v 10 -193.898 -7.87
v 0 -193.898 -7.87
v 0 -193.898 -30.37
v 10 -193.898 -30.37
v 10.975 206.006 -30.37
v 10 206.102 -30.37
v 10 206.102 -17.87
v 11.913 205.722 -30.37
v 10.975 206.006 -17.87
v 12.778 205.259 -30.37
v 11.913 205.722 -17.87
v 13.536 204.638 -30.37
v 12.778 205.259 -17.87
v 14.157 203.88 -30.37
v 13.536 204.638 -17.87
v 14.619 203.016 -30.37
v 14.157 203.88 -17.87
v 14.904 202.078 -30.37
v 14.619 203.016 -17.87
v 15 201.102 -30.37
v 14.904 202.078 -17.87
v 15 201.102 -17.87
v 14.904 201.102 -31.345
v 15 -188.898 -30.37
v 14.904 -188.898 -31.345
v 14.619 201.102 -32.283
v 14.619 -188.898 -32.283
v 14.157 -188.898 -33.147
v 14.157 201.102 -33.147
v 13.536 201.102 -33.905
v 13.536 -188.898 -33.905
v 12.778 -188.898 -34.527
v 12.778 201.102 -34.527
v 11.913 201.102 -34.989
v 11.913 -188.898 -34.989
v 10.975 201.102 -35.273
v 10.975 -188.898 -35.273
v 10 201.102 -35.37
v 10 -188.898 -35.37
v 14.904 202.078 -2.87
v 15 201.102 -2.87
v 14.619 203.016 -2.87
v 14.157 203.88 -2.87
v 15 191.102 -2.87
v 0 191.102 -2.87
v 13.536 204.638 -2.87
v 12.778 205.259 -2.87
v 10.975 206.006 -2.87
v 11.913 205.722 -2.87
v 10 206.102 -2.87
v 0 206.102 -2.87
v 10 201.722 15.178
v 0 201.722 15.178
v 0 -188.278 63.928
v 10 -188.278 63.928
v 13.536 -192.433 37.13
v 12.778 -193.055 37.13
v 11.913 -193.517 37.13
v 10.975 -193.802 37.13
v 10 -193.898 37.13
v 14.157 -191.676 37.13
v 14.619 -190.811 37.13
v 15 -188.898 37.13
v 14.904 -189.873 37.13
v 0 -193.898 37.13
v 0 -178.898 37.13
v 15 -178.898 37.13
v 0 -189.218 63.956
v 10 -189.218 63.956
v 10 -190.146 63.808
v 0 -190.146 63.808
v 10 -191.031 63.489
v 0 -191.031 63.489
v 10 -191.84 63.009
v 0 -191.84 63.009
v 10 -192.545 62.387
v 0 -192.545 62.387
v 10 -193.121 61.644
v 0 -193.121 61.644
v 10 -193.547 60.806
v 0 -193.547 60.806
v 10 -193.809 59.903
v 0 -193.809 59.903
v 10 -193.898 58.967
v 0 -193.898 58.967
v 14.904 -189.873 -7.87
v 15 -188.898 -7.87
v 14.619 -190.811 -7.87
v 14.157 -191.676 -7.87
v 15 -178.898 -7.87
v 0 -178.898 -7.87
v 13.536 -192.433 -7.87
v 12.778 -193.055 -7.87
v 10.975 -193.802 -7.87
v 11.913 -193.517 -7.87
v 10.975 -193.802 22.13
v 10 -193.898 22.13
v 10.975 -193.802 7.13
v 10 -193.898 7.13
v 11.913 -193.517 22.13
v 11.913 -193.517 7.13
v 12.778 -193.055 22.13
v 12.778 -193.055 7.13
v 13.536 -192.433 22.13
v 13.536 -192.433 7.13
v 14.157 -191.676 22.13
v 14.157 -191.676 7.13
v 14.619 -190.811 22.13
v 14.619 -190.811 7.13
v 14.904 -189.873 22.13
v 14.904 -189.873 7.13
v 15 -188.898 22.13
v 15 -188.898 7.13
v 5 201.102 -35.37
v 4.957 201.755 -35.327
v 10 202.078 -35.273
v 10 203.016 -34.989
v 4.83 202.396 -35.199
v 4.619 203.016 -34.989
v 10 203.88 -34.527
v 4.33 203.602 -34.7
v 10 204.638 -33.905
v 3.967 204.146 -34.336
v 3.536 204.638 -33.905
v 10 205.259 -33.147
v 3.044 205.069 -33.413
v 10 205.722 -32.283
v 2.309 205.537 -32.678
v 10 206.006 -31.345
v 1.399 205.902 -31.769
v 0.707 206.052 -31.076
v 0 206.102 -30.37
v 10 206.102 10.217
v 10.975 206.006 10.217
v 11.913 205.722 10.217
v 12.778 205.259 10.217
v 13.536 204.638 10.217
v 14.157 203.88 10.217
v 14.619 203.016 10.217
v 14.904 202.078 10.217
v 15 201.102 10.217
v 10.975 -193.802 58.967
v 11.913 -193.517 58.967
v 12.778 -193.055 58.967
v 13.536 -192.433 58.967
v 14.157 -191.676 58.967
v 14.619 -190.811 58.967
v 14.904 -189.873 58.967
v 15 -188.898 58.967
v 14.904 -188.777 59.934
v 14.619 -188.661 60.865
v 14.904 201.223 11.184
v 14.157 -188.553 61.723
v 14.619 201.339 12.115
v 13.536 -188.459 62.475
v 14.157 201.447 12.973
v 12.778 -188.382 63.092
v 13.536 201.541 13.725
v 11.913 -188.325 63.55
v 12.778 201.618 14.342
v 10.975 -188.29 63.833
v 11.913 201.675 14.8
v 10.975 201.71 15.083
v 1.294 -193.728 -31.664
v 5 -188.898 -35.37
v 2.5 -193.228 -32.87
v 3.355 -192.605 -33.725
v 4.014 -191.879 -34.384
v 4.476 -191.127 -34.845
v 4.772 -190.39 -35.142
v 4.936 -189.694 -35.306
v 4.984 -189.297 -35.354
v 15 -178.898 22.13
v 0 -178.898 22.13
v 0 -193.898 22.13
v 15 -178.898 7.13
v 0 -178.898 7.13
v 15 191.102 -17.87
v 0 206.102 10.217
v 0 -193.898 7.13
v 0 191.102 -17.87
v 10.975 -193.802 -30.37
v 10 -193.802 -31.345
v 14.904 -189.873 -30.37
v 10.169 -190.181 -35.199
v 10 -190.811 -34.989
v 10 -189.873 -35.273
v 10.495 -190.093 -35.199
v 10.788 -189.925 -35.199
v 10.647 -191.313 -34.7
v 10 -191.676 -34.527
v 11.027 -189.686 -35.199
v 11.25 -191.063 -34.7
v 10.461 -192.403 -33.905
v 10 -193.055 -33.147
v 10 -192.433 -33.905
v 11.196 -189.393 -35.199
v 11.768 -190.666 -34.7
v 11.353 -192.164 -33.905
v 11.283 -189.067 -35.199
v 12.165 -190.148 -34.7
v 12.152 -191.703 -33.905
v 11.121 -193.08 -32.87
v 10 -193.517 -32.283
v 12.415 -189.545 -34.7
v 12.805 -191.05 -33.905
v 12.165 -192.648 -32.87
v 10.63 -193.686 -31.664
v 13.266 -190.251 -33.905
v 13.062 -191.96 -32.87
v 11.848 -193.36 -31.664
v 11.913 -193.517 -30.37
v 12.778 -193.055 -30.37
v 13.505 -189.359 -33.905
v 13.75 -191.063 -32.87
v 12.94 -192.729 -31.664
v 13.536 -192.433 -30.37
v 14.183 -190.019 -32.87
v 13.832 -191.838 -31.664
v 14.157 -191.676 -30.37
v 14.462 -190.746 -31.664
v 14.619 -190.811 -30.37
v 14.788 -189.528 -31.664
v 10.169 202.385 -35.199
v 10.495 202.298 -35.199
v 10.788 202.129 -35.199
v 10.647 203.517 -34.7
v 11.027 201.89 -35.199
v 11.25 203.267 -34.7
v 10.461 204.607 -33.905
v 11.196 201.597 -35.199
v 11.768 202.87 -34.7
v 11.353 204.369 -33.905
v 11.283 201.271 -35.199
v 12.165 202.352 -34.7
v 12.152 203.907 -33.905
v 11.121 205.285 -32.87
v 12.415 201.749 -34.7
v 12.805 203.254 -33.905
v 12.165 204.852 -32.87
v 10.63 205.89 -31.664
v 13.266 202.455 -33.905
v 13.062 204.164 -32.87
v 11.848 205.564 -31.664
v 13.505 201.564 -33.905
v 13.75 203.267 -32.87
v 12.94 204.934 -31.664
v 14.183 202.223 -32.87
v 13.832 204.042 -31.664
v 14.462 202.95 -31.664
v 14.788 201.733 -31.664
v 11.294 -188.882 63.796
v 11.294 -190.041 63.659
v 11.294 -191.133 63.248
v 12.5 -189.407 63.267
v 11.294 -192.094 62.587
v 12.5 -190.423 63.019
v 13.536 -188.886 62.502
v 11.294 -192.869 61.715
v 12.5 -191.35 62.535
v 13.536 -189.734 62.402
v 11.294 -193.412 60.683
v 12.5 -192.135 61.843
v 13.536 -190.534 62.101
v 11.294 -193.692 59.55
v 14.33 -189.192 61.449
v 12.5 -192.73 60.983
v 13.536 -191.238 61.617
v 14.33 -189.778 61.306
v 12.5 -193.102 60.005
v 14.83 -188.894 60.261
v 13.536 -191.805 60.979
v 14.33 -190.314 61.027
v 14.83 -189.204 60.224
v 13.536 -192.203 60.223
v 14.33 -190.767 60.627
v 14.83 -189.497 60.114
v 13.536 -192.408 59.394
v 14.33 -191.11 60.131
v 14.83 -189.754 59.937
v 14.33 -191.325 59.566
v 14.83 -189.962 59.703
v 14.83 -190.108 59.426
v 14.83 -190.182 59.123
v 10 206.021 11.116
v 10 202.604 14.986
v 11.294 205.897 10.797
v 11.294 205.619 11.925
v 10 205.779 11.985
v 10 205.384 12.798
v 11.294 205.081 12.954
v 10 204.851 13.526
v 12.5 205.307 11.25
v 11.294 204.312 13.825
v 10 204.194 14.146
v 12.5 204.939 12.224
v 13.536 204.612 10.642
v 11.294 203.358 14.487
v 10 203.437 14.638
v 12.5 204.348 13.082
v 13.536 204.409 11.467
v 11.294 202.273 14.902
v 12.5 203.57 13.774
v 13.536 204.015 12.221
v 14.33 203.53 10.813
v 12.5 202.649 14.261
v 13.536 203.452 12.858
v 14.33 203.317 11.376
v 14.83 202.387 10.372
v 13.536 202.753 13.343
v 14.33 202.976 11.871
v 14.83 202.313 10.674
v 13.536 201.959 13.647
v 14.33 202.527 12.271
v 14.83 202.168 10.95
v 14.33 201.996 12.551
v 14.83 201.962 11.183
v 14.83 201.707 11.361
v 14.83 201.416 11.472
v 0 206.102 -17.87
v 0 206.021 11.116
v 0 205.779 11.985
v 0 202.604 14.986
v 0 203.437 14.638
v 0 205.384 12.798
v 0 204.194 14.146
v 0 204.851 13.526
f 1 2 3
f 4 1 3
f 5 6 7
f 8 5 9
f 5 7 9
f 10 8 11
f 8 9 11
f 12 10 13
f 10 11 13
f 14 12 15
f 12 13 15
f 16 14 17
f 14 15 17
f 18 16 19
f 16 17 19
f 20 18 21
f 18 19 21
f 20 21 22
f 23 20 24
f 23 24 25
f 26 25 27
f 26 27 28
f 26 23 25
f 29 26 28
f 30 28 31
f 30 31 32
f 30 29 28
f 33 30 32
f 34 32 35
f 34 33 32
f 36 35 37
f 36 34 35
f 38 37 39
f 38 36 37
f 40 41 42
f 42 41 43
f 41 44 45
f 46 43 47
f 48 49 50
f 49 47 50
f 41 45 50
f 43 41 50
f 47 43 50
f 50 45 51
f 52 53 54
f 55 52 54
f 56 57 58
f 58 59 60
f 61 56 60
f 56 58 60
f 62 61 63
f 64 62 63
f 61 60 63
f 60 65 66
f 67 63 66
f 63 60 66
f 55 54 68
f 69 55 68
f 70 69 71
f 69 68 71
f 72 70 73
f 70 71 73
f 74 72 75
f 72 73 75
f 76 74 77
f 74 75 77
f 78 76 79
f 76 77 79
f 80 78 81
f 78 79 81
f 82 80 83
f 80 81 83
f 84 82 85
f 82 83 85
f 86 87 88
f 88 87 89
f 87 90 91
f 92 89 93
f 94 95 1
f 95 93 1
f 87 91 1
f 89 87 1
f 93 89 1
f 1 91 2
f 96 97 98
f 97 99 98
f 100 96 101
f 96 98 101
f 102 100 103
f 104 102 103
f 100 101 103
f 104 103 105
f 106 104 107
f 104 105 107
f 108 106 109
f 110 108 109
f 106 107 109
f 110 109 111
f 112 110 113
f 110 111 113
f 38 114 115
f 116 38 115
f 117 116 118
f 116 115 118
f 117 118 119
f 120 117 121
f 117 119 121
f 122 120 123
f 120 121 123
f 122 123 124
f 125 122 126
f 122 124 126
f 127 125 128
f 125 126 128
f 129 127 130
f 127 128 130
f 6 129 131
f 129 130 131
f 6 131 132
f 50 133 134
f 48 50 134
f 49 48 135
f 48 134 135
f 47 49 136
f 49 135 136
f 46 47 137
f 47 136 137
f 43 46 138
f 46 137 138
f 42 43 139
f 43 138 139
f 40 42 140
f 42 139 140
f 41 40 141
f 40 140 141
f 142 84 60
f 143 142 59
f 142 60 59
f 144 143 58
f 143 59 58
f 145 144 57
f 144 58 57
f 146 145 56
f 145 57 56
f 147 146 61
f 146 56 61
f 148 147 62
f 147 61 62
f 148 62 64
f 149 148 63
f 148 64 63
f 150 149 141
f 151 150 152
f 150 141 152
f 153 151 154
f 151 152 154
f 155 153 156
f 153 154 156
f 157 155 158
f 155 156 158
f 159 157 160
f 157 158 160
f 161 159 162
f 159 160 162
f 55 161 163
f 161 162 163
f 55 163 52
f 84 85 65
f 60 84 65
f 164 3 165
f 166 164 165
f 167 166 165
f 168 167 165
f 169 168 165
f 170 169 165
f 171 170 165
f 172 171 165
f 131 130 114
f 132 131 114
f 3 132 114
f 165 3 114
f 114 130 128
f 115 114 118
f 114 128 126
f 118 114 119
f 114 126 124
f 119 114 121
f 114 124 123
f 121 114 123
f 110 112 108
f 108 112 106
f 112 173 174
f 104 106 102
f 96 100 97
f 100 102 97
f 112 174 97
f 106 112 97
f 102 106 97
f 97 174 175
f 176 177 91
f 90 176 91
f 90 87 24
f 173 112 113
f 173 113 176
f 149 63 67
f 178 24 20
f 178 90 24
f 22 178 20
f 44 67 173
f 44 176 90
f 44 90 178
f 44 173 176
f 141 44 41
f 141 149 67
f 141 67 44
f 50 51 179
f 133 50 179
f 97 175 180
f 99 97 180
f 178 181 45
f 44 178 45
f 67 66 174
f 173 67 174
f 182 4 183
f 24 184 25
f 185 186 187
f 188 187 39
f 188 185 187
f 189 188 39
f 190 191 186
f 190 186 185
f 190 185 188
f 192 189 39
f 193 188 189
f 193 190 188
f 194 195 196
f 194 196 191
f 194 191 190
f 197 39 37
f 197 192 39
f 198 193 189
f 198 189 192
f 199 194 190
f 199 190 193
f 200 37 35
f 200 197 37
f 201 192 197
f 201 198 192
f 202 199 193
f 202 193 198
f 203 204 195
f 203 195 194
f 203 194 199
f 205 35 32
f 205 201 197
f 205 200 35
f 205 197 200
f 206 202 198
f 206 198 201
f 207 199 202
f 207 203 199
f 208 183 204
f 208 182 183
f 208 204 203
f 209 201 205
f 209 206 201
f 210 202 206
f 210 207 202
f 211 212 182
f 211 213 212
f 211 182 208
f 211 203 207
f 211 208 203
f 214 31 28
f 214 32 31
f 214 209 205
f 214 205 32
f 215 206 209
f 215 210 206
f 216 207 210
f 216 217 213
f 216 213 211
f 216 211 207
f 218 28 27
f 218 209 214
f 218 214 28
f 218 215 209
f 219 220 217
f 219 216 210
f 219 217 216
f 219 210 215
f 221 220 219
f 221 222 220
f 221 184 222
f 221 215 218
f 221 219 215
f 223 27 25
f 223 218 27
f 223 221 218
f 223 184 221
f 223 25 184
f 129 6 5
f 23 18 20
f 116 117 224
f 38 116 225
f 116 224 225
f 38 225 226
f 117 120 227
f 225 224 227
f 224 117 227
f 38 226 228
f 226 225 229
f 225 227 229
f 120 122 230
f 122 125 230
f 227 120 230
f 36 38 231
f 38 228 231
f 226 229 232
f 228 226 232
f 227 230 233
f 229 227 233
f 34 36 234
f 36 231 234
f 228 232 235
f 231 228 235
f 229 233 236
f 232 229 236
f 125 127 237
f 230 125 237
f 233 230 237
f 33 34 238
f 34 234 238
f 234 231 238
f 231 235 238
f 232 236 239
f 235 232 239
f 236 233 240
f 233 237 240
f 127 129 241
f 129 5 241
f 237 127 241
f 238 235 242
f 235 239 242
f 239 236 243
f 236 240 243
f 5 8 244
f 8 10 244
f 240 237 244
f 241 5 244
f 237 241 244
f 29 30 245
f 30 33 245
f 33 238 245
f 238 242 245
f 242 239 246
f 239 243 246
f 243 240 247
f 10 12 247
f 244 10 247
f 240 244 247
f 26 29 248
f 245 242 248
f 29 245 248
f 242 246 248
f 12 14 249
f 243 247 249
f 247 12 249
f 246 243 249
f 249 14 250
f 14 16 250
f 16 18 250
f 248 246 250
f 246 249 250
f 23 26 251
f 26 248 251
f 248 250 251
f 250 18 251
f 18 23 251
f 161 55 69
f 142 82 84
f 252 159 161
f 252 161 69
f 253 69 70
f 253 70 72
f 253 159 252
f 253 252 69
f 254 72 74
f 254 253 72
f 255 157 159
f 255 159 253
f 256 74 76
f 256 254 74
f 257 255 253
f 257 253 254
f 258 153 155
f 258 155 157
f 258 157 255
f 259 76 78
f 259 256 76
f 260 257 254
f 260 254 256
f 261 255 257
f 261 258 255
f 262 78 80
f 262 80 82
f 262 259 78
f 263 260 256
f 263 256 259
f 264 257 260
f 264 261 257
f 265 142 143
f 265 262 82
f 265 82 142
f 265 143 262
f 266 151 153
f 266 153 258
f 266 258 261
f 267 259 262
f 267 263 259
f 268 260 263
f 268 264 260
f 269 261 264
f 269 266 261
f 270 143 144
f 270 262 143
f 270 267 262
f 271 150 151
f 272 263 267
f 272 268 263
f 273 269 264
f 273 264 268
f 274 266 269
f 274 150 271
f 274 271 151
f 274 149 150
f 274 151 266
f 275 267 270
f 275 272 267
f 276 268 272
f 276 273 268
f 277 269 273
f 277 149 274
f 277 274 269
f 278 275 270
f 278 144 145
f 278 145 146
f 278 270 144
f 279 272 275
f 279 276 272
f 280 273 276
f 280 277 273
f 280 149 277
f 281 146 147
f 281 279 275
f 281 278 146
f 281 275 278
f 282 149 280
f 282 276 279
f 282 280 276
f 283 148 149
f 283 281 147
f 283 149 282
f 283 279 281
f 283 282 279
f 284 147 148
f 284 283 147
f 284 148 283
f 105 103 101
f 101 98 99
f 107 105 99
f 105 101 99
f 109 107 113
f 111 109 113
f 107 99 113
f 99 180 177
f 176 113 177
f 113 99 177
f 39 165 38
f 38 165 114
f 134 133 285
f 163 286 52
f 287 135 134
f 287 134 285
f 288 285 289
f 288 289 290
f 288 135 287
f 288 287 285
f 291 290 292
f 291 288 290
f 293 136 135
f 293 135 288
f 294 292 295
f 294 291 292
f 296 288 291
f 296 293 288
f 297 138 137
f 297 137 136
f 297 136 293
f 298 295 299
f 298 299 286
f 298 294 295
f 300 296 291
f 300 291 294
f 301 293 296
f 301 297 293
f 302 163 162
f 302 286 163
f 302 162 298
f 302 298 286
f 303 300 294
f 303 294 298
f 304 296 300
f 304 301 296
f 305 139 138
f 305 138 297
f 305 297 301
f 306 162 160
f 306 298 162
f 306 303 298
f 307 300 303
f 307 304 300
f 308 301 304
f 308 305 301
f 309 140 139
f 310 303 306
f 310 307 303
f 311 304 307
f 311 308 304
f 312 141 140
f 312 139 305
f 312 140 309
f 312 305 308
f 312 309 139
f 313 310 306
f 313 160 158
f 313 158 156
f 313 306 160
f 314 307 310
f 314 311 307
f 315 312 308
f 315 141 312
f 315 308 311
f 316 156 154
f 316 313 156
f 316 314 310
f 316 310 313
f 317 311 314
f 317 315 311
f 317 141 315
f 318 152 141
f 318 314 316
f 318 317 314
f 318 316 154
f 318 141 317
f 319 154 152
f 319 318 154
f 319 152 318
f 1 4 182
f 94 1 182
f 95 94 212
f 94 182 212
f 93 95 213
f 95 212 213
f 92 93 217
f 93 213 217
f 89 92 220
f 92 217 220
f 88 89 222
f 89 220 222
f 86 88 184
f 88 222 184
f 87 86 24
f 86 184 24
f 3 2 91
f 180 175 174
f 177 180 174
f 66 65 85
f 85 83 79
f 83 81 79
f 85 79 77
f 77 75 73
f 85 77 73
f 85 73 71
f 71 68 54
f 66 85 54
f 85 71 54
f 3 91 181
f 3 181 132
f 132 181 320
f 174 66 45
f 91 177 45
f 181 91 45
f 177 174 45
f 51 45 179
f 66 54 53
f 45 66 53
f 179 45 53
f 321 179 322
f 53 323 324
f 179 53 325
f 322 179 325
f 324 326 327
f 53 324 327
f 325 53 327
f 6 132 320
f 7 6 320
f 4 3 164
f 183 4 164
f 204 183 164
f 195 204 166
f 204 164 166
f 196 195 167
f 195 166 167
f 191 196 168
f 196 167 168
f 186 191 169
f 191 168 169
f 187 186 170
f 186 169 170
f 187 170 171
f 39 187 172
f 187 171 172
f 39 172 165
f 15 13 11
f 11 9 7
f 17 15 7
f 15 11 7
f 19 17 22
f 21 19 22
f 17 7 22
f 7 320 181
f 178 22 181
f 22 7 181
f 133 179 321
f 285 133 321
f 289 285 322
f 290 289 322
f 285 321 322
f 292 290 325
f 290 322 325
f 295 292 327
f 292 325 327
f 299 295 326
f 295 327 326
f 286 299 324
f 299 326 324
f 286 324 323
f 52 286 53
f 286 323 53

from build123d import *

# Parameters (mm, degrees)
F1_DEPTH     = 15
F2_R         = 5
F3_T1_DEPTH  = 418.0350652296
F4_T1_DEPTH  = 390
F4_T3_DEPTH  = 22.5
F4_T5_DEPTH  = 21.0347777317
F4_T7_DEPTH  = 24.1597777317
F4_T12_DEPTH = 5
F4_T18_DEPTH = 5
F4_T22_ANGLE = 90
F4_T24_ANGLE = 90
F5_T1_DEPTH  = 415.7168298797


# Not quite as in the source:
# - a fillet or chamfer that OpenCascade refuses, or shapes differently, is made with other operations: its cross-section is extruded or revolved along the edge and cut away or added


with BuildPart() as f1:
    # F0 (on Right) → F1 (new body)
    with BuildSketch(Plane.YZ):
        Polygon((-193.8978725672, -35.3695585671), (206.1021274328, -35.3695585671), (206.1021274328, -17.8695585671), (191.1021274328, -17.8695585671), (191.1021274328, -2.8695585671), (206.1021274328, -2.8695585671), (206.1021274328, 14.6304414329), (-193.8978725672, 64.6304414329), (-193.8978725672, 37.1304414329), (-178.8978725672, 37.1304414329), (-178.8978725672, 22.1304414329), (-193.8978725672, 22.1304414329), (-193.8978725672, 7.1304414329), (-178.8978725672, 7.1304414329), (-178.8978725672, -7.8695585671), (-193.8978725672, -7.8695585671), align=None)
    extrude(amount=F1_DEPTH)

    # F2
    f2_edges = [f1.edges().sort_by_distance(p)[0] for p in [
        (15, 206.102127, 5.880441),
        (15, 206.102127, -26.619559),
        (15, -193.897873, -21.619559),
        (15, -193.897873, 14.630441),
        (15, -193.897873, 50.880441),
    ]]
    fillet(f2_edges, radius=F2_R)

    # F3: fillet of radius 5 on 1 edges, made by hand

    # F3_s2 → F3_t1 (cut)
    with BuildSketch(Plane(origin=(0, 208.5341292164, -26.0667661521), x_dir=(1, 0, 0), z_dir=(0, -0.9922778767, 0.1240347346))):
        with BuildLine():
            ThreePointArc((15, 35.0812860348), (13.5355339059, 38.6168199408), (10, 40.0812860348))
            Line((10, 40.0812860348), (15, 40.0812860348))
            Line((15, 40.0812860348), (15, 35.0812860348))
        make_face()
    extrude(amount=F3_T1_DEPTH, mode=Mode.SUBTRACT)

    # F4: fillet of radius 5 on 7 edges, made by hand

    # F4_s2 → F4_t1 (cut)
    with BuildSketch(Plane.XZ.offset(-201.1021274328)):
        with BuildLine():
            ThreePointArc((15, -30.3695585671), (13.5355339059, -33.905092473), (10, -35.3695585671))
            Line((10, -35.3695585671), (15, -35.3695585671))
            Line((15, -35.3695585671), (15, -30.3695585671))
        make_face()
    extrude(amount=F4_T1_DEPTH, mode=Mode.SUBTRACT)

    # F4_s4 → F4_t3 (cut)
    with BuildSketch(Plane.YZ.offset(-12.5)):
        with BuildLine():
            ThreePointArc((-193.8978725672, -30.3695585671), (-192.4334064731, -33.905092473), (-188.8978725672, -35.3695585671))
            Line((-188.8978725672, -35.3695585671), (-193.8978725672, -35.3695585671))
            Line((-193.8978725672, -35.3695585671), (-193.8978725672, -30.3695585671))
        make_face()
        with BuildLine():
            ThreePointArc((201.1021274328, -35.3695585671), (204.6376613388, -33.905092473), (206.1021274328, -30.3695585671))
            Line((206.1021274328, -30.3695585671), (206.1021274328, -35.3695585671))
            Line((206.1021274328, -35.3695585671), (201.1021274328, -35.3695585671))
        make_face()
    extrude(amount=F4_T3_DEPTH, mode=Mode.SUBTRACT)

    # F4_s6 → F4_t5 (cut)
    with BuildSketch(Plane.YZ.offset(-11.0347777317)):
        with BuildLine():
            ThreePointArc((206.1021274328, 10.2165303402), (204.8505183119, 13.5255431564), (201.7223011058, 15.1779197238))
            Line((201.7223011058, 15.1779197238), (206.1021274328, 14.6304414329))
            Line((206.1021274328, 14.6304414329), (206.1021274328, 10.2165303402))
        make_face()
    extrude(amount=F4_T5_DEPTH, mode=Mode.SUBTRACT)

    # F4_s8 → F4_t7 (cut)
    with BuildSketch(Plane.YZ.offset(-14.1597777317)):
        with BuildLine():
            ThreePointArc((-188.2776988942, 63.9279197238), (-192.2068853834, 62.7149212193), (-193.8978725672, 58.9665303402))
            Line((-193.8978725672, 58.9665303402), (-193.8978725672, 64.6304414329))
            Line((-193.8978725672, 64.6304414329), (-188.2776988942, 63.9279197238))
        make_face()
    extrude(amount=F4_T7_DEPTH, mode=Mode.SUBTRACT)


with BuildPart() as f4_tool10:
    # F4_s11 → F4_t12 (new body)
    with BuildSketch(Plane.YZ.offset(10)):
        Polygon((-188.8978725672, 58.9665303402), (-188.2776988942, 63.9279197238), (-193.8978725672, 64.6304414329), (-193.8978725672, 58.9665303402), align=None)
    extrude(amount=F4_T12_DEPTH)

    # F4_s13 → F4_t14 (revolve, cut)
    with BuildSketch(Plane(origin=(10, -188.8978725672, 58.9665303402), x_dir=(0, 0.6618025632, -0.7496781758), z_dir=(0, -0.7496781758, -0.6618025632))):
        with BuildLine():
            ThreePointArc((0, -5), (5, 0), (0, 5))
            Line((0, 5), (0, -5))
        make_face()
    revolve(axis=Axis((10, -188.8978725672, 58.9665303402), (1, 0, 0)), mode=Mode.SUBTRACT)


with BuildPart() as f1_1:
    add(f1.part)

    # F4_t9: cut F4_tool10
    add(f4_tool10.part, mode=Mode.SUBTRACT)


with BuildPart() as f4_tool16:
    # F4_s17 → F4_t18 (new body)
    with BuildSketch(Plane.YZ.offset(10)):
        Polygon((201.1021274328, 10.2165303402), (206.1021274328, 10.2165303402), (206.1021274328, 14.6304414329), (201.7223011058, 15.1779197238), align=None)
    extrude(amount=F4_T18_DEPTH)

    # F4_s19 → F4_t20 (revolve, cut)
    with BuildSketch(Plane(origin=(10, 201.1021274328, 10.2165303402), x_dir=(0, -0.7496781758, -0.6618025632), z_dir=(0, -0.6618025632, 0.7496781758))):
        with BuildLine():
            ThreePointArc((0, -5), (5, 0), (0, 5))
            Line((0, 5), (0, -5))
        make_face()
    revolve(axis=Axis((10, 201.1021274328, 10.2165303402), (1, 0, 0)), mode=Mode.SUBTRACT)


with BuildPart() as f1_2:
    add(f1_1.part)

    # F4_t15: cut F4_tool16
    add(f4_tool16.part, mode=Mode.SUBTRACT)

    # F4_s21 → F4_t22 (revolve, cut)
    with BuildSketch(Plane.YZ.offset(10)):
        with BuildLine():
            ThreePointArc((-188.8978725672, -35.3695585671), (-192.4334064731, -33.905092473), (-193.8978725672, -30.3695585671))
            Line((-193.8978725672, -30.3695585671), (-193.8978725672, -35.3695585671))
            Line((-193.8978725672, -35.3695585671), (-188.8978725672, -35.3695585671))
        make_face()
    revolve(axis=Axis((10, -188.8978725672, -35.3695585671), (0, 0, 1)), revolution_arc=F4_T22_ANGLE, mode=Mode.SUBTRACT)

    # F4_s23 → F4_t24 (revolve, cut)
    with BuildSketch(Plane.YZ.offset(10)):
        with BuildLine():
            ThreePointArc((201.1021274328, -35.3695585671), (204.6376613388, -33.905092473), (206.1021274328, -30.3695585671))
            Line((206.1021274328, -30.3695585671), (206.1021274328, -35.3695585671))
            Line((206.1021274328, -35.3695585671), (201.1021274328, -35.3695585671))
        make_face()
    revolve(axis=Axis((10, 201.1021274328, -35.3695585671), (0, 0, -1)), revolution_arc=F4_T24_ANGLE, mode=Mode.SUBTRACT)

    # F5: chamfer of 5 on 1 edges, made by hand

    # F5_s2 → F5_t1 (cut)
    with BuildSketch(Plane.XZ.offset(-213.9605423726)):
        Polygon((0, -30.3695585671), (5, -35.3695585671), (0, -35.3695585671), align=None)
    extrude(amount=F5_T1_DEPTH, mode=Mode.SUBTRACT)


solid = f1_2.part
